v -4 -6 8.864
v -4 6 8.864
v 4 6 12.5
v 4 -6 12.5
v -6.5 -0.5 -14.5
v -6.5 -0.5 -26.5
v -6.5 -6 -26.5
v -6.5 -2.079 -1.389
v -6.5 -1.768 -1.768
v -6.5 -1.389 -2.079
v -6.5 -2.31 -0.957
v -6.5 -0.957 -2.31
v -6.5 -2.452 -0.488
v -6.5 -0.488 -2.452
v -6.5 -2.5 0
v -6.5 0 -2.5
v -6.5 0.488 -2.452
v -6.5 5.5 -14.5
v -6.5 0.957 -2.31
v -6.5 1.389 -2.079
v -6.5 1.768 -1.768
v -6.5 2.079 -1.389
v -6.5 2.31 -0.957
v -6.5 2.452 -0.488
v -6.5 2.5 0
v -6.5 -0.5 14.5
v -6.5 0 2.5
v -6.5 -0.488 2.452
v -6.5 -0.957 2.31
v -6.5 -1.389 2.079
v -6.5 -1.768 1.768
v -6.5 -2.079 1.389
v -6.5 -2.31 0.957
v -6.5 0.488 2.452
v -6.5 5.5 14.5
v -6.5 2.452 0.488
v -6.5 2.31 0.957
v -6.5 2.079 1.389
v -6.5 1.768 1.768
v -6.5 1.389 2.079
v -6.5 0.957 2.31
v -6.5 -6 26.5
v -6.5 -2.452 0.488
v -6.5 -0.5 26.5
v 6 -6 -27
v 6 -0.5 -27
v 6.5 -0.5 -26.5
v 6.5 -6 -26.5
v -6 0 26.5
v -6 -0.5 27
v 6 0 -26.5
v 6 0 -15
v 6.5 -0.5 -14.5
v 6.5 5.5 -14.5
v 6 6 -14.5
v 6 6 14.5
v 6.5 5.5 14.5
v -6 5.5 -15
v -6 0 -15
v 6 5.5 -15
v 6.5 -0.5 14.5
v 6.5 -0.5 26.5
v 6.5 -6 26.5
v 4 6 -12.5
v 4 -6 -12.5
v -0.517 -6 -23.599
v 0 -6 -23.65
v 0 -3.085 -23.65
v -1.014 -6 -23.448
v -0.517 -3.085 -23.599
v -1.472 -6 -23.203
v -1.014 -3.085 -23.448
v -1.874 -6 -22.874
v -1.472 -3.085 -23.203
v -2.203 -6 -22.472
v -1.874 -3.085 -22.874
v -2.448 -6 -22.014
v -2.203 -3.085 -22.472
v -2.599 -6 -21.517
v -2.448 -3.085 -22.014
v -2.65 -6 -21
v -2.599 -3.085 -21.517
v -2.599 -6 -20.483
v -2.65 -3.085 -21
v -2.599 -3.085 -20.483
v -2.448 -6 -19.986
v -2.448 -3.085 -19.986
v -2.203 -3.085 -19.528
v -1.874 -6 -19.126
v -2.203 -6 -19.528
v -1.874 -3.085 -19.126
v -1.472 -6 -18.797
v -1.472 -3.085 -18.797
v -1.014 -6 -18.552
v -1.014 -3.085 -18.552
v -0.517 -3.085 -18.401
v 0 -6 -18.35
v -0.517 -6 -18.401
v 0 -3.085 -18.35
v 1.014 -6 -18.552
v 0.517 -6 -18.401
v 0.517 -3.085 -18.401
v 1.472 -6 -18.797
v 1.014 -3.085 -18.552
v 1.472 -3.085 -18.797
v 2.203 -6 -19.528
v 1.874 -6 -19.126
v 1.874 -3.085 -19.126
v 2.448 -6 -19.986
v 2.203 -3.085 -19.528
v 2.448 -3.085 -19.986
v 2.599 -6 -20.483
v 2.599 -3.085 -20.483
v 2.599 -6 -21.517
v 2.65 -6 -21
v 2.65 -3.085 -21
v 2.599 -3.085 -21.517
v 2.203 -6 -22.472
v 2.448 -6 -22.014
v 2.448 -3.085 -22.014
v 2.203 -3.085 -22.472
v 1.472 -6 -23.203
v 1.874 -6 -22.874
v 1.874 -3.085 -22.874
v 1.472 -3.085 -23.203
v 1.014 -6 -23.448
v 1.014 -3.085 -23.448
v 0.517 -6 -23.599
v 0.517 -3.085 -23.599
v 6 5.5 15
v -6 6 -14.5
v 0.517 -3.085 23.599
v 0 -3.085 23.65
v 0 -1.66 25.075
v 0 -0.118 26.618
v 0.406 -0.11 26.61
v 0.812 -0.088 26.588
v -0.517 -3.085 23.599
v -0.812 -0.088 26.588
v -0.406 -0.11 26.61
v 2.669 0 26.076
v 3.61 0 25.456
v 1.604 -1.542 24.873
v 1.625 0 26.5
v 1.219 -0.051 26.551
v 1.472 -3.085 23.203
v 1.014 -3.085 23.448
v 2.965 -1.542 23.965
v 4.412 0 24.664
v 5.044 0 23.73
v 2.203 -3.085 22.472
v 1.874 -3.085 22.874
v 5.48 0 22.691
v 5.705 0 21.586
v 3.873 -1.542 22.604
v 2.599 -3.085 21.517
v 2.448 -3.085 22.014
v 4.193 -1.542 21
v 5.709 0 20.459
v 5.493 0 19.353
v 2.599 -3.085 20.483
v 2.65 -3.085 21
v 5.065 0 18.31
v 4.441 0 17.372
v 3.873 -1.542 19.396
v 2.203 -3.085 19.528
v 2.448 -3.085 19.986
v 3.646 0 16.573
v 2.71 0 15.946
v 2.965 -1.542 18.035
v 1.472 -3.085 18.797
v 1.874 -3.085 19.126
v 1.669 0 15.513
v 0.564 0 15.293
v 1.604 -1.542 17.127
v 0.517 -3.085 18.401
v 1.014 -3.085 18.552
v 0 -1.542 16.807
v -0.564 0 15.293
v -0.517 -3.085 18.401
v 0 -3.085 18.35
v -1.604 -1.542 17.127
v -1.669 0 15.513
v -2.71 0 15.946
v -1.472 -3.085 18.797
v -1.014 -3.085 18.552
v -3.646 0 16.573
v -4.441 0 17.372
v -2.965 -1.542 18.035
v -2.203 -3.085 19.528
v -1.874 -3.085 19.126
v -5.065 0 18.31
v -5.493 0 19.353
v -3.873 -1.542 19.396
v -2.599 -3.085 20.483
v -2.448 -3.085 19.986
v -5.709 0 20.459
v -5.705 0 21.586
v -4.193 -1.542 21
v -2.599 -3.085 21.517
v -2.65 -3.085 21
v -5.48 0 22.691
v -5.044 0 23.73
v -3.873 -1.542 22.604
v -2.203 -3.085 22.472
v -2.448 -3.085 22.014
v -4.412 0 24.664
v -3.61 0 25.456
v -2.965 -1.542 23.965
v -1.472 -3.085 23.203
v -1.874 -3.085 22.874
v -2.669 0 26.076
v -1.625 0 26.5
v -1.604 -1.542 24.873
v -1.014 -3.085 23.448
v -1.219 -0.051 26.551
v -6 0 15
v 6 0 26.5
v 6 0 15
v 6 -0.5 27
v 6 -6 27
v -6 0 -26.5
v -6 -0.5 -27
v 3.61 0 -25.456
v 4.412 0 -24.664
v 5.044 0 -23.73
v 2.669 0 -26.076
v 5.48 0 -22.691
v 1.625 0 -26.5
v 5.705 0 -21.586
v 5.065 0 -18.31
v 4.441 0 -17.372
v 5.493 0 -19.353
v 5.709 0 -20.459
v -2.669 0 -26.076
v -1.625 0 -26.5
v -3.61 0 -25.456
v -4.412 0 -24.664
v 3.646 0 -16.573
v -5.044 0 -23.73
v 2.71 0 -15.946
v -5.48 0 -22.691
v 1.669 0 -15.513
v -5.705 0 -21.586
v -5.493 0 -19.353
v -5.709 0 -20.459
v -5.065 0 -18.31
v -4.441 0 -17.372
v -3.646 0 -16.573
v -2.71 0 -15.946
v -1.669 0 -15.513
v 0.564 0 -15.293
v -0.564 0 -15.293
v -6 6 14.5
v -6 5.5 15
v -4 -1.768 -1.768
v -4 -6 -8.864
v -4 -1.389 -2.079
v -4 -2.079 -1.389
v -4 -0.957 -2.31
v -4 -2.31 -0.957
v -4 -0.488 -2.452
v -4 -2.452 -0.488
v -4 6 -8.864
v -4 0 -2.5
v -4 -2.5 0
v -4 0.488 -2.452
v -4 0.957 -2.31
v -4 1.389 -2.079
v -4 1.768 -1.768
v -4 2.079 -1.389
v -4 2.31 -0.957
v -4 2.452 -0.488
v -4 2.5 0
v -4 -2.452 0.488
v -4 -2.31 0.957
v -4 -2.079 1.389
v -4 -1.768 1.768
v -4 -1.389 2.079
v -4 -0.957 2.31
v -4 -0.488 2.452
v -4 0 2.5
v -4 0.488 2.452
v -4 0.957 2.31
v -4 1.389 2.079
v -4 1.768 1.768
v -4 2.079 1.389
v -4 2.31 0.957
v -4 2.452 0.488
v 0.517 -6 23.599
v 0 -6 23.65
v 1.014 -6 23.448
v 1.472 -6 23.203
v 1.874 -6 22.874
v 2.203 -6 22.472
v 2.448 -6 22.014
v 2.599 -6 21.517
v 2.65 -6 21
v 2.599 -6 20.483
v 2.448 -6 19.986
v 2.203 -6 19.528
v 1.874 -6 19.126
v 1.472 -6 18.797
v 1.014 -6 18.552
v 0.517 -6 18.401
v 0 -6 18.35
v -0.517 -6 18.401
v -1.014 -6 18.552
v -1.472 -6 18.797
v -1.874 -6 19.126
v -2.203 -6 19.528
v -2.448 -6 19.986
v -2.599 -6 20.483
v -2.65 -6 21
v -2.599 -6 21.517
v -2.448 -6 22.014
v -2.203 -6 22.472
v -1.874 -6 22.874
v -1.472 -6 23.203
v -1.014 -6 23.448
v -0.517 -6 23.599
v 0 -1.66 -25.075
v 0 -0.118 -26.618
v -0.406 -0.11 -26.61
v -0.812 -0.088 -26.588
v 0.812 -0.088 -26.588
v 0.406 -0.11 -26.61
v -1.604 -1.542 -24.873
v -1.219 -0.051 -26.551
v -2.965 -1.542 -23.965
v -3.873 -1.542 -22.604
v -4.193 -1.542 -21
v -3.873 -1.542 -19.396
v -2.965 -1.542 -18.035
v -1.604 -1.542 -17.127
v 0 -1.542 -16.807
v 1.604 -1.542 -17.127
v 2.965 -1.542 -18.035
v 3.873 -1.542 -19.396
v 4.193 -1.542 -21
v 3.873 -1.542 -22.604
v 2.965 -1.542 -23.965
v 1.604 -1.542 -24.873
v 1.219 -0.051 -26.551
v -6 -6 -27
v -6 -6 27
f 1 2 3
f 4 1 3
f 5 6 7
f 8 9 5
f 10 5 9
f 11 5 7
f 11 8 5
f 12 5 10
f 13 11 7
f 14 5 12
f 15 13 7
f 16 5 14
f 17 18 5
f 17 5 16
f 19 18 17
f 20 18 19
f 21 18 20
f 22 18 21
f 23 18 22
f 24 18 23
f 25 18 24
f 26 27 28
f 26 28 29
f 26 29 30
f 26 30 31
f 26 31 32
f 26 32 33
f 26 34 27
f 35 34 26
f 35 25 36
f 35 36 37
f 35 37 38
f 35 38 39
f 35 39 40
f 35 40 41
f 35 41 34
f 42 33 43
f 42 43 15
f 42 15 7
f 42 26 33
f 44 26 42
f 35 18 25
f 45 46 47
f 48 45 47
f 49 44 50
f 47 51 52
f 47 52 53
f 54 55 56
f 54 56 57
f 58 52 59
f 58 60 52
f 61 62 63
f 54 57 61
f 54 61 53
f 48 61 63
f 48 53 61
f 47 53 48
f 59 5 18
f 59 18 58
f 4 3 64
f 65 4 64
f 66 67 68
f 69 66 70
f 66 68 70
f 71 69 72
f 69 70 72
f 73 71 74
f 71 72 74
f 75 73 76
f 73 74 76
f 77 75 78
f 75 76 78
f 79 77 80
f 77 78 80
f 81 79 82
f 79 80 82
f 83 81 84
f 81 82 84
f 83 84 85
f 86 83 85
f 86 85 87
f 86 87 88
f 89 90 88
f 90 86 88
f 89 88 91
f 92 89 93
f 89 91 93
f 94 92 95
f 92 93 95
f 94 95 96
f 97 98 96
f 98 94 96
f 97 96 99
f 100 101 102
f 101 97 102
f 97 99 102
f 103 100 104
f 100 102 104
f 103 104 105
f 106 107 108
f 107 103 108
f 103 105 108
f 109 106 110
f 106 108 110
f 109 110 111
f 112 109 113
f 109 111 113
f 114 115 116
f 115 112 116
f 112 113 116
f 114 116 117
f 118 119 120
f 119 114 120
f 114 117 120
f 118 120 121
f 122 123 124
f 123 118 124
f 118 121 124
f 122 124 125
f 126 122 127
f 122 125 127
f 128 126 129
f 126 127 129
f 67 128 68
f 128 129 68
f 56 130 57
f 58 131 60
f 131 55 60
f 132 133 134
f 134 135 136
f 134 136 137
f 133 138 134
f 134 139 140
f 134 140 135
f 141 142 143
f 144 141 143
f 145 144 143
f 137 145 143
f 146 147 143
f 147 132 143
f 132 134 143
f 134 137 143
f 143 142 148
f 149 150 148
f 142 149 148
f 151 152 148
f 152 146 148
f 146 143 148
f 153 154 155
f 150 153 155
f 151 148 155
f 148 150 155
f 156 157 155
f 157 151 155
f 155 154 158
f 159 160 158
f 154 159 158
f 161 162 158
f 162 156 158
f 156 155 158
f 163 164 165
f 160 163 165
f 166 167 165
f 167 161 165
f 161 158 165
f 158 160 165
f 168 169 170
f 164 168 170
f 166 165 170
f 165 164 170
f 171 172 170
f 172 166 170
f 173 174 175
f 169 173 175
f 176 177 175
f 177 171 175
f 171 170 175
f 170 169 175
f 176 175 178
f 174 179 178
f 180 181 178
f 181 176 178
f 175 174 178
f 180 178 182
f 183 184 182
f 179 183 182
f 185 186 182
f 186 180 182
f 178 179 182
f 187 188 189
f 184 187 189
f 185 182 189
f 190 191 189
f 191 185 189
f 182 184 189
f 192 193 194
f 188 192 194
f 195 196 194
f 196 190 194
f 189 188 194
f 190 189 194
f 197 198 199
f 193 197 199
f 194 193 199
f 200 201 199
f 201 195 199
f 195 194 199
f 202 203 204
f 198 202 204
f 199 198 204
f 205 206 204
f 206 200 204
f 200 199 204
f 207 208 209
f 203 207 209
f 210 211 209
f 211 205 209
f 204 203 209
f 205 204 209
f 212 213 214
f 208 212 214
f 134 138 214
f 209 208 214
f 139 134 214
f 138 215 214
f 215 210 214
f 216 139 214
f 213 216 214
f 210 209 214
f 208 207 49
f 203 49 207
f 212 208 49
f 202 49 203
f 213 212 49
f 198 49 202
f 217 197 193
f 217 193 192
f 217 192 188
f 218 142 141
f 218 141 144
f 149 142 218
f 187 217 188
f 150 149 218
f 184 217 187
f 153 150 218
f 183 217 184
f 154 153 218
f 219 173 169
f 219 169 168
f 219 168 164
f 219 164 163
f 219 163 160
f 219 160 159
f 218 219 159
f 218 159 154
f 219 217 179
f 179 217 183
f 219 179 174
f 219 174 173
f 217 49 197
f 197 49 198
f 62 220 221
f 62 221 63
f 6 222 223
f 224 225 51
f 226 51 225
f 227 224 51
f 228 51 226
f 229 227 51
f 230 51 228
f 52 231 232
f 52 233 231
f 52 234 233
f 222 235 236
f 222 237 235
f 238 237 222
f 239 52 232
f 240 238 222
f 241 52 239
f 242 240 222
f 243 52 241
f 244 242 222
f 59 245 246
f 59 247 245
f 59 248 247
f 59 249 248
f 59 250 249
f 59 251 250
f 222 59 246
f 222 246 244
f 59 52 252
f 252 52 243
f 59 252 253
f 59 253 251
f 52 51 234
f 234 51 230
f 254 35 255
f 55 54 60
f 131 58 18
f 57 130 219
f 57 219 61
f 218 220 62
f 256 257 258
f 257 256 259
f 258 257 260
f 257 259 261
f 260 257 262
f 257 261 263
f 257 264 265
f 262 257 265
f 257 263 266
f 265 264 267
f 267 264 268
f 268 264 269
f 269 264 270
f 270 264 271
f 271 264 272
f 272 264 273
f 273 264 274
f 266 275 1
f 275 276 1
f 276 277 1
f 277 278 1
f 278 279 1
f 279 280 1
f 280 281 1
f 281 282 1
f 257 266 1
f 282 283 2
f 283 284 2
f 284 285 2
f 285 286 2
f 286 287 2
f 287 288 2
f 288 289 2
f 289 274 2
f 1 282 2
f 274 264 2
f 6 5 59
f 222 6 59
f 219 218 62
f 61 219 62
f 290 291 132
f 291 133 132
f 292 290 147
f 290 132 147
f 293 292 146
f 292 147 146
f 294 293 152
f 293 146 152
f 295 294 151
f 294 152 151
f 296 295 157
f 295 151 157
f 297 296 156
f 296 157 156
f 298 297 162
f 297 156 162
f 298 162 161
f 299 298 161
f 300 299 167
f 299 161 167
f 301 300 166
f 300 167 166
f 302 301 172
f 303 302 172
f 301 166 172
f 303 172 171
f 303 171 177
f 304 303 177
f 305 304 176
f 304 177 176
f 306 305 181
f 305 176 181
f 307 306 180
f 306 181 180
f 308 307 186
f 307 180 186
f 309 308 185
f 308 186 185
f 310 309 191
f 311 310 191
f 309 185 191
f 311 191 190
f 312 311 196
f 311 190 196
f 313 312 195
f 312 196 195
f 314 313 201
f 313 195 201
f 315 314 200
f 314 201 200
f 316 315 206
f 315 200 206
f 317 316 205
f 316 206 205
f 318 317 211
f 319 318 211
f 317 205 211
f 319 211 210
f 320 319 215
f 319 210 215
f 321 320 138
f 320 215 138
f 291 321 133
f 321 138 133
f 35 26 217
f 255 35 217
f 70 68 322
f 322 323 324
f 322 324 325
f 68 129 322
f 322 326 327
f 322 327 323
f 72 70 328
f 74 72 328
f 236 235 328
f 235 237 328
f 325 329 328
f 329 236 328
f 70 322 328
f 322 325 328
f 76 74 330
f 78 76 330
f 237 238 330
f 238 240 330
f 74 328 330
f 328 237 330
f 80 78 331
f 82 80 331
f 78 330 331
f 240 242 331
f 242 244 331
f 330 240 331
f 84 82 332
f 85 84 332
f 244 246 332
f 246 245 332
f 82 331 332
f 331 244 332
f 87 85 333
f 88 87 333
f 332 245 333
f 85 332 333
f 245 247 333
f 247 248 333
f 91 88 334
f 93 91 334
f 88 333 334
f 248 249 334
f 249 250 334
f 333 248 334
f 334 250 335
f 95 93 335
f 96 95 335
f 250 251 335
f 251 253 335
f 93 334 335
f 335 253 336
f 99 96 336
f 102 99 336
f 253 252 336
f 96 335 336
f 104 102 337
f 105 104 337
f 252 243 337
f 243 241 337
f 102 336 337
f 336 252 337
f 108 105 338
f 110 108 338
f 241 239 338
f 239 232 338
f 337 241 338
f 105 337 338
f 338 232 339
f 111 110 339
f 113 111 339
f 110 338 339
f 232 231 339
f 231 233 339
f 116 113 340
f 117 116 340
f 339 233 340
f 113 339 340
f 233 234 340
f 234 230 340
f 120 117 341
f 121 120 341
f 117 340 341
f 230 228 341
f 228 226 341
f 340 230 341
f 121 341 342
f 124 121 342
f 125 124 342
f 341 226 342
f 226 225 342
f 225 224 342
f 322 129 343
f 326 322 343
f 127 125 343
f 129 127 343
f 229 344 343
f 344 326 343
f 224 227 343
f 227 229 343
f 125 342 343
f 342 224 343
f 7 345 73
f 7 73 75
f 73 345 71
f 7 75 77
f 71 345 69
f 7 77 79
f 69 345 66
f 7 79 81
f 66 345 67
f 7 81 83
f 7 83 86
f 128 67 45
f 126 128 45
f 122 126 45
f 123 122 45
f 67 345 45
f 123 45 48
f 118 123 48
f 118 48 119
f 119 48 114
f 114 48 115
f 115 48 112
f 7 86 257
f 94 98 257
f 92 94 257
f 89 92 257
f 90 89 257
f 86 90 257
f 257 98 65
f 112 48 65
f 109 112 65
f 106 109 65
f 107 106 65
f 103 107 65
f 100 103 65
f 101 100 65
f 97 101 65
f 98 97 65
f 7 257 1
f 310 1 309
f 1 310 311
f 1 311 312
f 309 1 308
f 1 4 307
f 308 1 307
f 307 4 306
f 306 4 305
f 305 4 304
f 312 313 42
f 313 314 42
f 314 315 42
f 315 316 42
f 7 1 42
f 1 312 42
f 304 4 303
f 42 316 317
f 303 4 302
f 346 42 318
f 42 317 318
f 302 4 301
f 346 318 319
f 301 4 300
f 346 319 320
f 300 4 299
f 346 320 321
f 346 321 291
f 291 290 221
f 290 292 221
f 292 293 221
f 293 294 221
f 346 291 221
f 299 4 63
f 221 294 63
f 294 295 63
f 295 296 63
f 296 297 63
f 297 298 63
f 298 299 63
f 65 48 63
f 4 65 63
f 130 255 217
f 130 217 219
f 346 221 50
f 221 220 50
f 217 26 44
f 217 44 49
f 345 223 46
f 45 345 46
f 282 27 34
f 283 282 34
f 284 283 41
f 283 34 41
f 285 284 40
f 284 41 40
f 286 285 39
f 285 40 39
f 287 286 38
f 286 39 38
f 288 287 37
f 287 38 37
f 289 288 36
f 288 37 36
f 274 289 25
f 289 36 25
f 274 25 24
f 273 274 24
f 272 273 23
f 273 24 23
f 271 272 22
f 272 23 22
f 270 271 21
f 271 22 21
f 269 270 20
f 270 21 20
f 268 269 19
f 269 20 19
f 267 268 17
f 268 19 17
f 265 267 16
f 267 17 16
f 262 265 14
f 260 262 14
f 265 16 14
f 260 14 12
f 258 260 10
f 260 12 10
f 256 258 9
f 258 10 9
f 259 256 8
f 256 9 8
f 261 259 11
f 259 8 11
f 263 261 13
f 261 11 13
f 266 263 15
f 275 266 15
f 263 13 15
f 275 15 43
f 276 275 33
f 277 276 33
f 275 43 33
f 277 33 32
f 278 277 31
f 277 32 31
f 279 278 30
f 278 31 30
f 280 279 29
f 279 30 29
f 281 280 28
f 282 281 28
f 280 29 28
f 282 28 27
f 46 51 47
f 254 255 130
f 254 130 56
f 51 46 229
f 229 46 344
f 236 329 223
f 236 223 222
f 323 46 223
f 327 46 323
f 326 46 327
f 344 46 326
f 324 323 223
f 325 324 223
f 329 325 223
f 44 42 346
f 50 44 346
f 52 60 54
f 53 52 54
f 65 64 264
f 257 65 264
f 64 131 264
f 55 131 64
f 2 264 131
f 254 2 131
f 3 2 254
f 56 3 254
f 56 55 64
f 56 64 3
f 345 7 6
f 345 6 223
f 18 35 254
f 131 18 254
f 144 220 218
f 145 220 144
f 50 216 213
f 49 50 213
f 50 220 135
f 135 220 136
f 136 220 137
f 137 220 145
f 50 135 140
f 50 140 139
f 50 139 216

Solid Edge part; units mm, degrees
sketch "Sketch1" plane through (0, 0, 0) normal (0, -1, 0) x (1, 0, 0)
  line L0 (-6.5, 15) -> (6.5, 15)
  line L1 (6.5, 15) -> (6.5, -15)
  line L2 (6.5, -15) -> (-6.5, -15)
  line L3 (-6.5, -15) -> (-6.5, 15)
  dimension "D1" = 13
  dimension "D2" = 30
extrude "Ajout_matière_1" add sketch "Sketch1" along normal mid plane 12
sketch "Sketch2" plane through (0, 6, 0) normal (0, 1, 0) x (-1, 0, 0)
  line L0 (-4, 12.5) -> (-4, -12.5)
  line L1 (-4, -12.5) -> (4, -8.8636)
  line L2 (4, -8.8636) -> (4, 8.8636)
  line L3 (4, 8.8636) -> (-4, 12.5)
  dimension "D1" = 8
  dimension "D2" = 25
extrude "Cutout1" cut sketch "Sketch2" against normal up to next
sketch "Sketch3" plane through (0, 0, 15) normal (0, 0, 1) x (1, 0, 0)
  line L0 (-6.5, 0) -> (6.5, 0)
  line L1 (6.5, 0) -> (6.5, -6)
  line L2 (6.5, -6) -> (-6.5, -6)
  line L3 (-6.5, -6) -> (-6.5, 0)
extrude "Protrusion1" add sketch "Sketch3" along normal blind 12 and the other way blind 1
hole "Perçage_2" at (0, 0, 21) direction (0, -1, 0) diameter 5.3 end up to next countersink diameter 11.47 countersink angle 90
mirror "Mirror1" about plane through (0, 0, 0) normal (0, 0, 1) of "Protrusion1", "Perçage_2"
hole "Perçage_4" at (-6.5, 0, 0) direction (1, 0, 0) diameter 5 end up to next
chamfer "Chanfrein_1" distance 0.5 angle 45 18 edges at (0, 6, 15) (6.5, 6, 0) (-6.5, 6, 0) (0, 6, -15) (-6.5, 3, 15) (-6.5, 3, -15) (-6.5, 0, -21) (6.5, 3, 15) (6.5, 3, -15) (6.5, 0, -21) (0, 0, -27) (6.5, 0, 21) (0, 0, 27) (-6.5, 0, 21) (6.5, -3, 27) (-6.5, -3, 27) (6.5, -3, -27) (-6.5, -3, -27)
properties material "Aluminium AU4G, 2024_T4"
